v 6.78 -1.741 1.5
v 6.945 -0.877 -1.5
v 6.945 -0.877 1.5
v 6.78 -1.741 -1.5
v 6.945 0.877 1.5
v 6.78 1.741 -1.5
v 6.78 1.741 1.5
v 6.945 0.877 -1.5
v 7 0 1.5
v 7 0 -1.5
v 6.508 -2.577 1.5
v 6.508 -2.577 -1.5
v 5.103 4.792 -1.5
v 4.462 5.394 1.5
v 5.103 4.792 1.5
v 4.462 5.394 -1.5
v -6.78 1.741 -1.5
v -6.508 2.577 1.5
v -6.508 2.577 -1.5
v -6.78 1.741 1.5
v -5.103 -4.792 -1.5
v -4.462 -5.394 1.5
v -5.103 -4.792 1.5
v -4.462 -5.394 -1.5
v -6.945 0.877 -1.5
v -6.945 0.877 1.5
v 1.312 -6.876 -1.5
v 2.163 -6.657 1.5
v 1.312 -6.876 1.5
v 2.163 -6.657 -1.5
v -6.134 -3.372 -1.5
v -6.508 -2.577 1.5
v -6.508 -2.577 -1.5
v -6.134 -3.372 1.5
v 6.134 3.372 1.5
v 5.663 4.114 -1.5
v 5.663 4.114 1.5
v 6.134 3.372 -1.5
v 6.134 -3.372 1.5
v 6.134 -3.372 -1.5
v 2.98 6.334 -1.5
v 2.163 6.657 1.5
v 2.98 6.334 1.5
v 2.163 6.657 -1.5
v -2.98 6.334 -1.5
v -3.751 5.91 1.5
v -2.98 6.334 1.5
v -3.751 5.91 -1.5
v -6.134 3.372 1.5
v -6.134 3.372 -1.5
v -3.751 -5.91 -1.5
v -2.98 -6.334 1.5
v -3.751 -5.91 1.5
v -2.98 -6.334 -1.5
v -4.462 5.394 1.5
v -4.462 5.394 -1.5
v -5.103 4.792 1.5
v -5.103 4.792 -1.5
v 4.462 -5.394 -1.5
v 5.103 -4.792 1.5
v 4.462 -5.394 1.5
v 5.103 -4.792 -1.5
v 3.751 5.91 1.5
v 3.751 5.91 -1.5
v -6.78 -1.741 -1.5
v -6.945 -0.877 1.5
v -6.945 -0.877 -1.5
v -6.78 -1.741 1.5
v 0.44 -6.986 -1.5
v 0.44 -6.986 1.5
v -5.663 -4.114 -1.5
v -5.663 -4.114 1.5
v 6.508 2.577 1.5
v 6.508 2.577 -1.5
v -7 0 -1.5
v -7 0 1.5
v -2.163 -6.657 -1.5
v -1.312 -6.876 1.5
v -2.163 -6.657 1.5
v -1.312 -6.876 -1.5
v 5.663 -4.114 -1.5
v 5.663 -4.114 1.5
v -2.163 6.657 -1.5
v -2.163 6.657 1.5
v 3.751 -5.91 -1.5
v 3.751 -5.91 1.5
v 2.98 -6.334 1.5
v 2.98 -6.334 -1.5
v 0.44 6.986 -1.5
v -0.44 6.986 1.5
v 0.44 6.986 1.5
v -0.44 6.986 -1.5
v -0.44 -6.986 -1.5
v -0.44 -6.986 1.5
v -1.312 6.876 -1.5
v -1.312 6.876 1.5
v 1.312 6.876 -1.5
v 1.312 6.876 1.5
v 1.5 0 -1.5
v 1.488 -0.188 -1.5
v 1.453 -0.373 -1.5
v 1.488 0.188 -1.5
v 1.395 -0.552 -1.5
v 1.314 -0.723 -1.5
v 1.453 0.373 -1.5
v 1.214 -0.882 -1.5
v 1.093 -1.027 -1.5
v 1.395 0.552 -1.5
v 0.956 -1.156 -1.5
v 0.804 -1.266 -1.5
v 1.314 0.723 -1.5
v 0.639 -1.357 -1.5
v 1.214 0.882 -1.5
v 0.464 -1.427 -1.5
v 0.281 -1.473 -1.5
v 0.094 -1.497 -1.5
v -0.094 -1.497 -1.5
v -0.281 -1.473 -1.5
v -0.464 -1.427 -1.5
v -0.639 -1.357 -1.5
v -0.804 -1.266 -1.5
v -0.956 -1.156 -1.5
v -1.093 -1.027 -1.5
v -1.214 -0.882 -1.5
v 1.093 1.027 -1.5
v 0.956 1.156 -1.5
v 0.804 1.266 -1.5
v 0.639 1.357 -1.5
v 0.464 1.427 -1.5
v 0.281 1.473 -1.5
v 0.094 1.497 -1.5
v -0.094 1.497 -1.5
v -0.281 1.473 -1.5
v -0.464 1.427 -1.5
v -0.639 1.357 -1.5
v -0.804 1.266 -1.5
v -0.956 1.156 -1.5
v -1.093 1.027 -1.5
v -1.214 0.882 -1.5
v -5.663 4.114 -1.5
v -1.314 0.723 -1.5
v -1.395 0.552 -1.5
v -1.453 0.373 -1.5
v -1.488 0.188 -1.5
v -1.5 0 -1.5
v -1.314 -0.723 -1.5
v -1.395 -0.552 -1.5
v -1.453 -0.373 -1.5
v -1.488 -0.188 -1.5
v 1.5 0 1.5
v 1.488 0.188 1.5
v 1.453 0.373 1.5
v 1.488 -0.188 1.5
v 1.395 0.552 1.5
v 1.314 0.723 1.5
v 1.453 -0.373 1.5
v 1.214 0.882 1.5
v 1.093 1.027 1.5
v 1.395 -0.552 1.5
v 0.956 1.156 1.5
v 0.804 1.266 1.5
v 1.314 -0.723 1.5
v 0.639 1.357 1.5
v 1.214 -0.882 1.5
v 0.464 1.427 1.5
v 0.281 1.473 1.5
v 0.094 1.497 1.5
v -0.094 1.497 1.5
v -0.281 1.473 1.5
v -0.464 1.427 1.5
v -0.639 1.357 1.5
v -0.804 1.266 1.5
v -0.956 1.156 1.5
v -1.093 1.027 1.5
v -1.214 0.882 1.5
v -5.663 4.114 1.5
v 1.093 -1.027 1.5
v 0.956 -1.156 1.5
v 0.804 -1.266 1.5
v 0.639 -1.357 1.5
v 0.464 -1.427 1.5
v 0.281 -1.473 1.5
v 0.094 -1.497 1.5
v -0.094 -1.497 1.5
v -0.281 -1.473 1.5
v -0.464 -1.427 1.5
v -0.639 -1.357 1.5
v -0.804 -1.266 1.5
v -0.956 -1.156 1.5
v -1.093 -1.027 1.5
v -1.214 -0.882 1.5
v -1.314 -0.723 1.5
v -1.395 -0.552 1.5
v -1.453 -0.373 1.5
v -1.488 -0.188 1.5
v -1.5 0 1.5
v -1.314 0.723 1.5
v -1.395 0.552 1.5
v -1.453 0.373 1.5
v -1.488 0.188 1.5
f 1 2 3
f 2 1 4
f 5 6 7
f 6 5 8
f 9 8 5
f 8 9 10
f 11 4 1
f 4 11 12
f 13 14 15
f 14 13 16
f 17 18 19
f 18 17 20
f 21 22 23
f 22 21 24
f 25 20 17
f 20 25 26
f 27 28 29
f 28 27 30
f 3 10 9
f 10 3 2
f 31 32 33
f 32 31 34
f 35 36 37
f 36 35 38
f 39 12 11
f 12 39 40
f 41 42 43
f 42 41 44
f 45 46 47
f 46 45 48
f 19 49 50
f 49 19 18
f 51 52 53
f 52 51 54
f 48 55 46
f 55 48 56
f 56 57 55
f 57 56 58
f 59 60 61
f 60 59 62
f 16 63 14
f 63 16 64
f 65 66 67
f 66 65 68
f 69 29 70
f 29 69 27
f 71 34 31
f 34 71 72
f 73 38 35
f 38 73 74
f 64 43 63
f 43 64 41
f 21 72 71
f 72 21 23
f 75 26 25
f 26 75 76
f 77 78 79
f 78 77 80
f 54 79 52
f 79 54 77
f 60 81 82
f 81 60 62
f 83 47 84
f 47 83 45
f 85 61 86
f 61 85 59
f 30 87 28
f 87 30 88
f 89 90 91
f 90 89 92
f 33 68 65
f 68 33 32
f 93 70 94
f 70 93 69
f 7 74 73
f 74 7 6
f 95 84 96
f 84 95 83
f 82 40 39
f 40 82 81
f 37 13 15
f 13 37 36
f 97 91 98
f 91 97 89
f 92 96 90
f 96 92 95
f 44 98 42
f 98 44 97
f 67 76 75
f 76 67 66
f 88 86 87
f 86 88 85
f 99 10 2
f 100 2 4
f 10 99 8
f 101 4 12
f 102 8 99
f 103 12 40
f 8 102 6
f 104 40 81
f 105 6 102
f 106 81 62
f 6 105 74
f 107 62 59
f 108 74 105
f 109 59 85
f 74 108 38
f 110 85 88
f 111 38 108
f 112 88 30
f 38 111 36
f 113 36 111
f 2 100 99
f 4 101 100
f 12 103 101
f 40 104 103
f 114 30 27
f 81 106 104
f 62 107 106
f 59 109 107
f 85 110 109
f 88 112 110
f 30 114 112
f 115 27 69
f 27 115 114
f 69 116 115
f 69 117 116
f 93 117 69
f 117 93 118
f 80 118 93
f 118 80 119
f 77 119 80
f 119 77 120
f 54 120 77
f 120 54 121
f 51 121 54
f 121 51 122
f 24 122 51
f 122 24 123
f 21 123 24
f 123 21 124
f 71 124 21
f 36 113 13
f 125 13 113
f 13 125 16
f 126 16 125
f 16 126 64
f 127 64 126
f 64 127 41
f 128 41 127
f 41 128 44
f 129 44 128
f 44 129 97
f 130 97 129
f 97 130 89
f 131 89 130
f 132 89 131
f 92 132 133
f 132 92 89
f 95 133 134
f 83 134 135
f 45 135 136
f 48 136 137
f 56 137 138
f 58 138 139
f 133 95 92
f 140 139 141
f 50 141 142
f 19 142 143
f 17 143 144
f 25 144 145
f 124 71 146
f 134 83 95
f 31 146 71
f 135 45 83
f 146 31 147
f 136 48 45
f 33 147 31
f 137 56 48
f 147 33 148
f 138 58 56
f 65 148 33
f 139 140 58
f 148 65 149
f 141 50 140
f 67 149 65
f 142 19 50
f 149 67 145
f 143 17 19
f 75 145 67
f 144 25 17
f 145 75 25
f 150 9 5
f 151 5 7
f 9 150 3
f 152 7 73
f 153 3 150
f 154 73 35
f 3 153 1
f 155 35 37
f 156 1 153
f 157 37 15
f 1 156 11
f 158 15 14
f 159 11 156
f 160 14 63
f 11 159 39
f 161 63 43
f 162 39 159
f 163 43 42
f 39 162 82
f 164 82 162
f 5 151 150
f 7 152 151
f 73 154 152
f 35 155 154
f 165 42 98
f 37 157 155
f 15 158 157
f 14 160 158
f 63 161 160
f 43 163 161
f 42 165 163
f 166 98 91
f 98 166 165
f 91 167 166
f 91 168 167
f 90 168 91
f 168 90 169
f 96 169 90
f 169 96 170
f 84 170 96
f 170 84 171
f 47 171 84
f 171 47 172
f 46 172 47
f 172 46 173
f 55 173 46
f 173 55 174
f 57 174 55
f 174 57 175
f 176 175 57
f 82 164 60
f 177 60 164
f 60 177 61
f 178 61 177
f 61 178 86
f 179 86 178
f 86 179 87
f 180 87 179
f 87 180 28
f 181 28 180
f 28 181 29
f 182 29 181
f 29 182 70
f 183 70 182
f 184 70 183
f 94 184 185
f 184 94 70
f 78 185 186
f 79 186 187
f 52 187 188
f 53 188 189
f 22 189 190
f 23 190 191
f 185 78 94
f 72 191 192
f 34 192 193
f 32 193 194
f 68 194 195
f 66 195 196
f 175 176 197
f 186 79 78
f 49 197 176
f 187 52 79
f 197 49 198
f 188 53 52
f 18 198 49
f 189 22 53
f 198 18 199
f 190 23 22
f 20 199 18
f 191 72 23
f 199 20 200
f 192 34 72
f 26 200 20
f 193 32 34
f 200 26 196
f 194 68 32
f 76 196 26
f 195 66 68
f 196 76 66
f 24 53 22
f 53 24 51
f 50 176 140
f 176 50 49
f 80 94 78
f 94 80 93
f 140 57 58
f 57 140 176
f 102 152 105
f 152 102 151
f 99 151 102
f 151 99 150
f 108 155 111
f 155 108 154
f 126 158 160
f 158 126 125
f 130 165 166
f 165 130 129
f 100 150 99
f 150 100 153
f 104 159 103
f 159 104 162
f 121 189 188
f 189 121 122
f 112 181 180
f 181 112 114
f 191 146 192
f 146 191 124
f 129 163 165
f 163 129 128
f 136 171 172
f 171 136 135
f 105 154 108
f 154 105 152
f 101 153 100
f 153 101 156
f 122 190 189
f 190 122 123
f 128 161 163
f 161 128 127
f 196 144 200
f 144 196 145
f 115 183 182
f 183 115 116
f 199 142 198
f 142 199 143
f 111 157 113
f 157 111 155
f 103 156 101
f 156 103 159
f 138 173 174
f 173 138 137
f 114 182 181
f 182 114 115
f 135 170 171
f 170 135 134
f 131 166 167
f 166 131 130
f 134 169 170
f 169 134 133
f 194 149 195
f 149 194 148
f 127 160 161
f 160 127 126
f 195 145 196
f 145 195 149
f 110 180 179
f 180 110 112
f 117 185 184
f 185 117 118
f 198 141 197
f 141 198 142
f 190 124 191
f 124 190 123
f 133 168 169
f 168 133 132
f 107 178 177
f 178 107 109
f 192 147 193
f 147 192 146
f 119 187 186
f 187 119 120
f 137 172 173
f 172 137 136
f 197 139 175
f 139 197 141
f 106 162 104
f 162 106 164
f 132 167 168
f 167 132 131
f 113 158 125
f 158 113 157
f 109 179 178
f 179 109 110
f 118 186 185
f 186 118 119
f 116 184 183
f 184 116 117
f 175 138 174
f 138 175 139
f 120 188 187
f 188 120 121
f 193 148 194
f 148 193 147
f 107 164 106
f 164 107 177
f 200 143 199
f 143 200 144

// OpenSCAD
$fn = 50;


difference() {
	union() {
		translate(v = [0, 0, -1.5000000000]) {
			cylinder(h = 3, r = 7.0000000000);
		}
		translate(v = [0, 0, -1.5000000000]) {
			cylinder(h = 3, r = 3.0000000000);
		}
	}
	union() {
		translate(v = [0, 0, -100.0000000000]) {
			cylinder(h = 200, r = 1.5000000000);
		}
	}
}
